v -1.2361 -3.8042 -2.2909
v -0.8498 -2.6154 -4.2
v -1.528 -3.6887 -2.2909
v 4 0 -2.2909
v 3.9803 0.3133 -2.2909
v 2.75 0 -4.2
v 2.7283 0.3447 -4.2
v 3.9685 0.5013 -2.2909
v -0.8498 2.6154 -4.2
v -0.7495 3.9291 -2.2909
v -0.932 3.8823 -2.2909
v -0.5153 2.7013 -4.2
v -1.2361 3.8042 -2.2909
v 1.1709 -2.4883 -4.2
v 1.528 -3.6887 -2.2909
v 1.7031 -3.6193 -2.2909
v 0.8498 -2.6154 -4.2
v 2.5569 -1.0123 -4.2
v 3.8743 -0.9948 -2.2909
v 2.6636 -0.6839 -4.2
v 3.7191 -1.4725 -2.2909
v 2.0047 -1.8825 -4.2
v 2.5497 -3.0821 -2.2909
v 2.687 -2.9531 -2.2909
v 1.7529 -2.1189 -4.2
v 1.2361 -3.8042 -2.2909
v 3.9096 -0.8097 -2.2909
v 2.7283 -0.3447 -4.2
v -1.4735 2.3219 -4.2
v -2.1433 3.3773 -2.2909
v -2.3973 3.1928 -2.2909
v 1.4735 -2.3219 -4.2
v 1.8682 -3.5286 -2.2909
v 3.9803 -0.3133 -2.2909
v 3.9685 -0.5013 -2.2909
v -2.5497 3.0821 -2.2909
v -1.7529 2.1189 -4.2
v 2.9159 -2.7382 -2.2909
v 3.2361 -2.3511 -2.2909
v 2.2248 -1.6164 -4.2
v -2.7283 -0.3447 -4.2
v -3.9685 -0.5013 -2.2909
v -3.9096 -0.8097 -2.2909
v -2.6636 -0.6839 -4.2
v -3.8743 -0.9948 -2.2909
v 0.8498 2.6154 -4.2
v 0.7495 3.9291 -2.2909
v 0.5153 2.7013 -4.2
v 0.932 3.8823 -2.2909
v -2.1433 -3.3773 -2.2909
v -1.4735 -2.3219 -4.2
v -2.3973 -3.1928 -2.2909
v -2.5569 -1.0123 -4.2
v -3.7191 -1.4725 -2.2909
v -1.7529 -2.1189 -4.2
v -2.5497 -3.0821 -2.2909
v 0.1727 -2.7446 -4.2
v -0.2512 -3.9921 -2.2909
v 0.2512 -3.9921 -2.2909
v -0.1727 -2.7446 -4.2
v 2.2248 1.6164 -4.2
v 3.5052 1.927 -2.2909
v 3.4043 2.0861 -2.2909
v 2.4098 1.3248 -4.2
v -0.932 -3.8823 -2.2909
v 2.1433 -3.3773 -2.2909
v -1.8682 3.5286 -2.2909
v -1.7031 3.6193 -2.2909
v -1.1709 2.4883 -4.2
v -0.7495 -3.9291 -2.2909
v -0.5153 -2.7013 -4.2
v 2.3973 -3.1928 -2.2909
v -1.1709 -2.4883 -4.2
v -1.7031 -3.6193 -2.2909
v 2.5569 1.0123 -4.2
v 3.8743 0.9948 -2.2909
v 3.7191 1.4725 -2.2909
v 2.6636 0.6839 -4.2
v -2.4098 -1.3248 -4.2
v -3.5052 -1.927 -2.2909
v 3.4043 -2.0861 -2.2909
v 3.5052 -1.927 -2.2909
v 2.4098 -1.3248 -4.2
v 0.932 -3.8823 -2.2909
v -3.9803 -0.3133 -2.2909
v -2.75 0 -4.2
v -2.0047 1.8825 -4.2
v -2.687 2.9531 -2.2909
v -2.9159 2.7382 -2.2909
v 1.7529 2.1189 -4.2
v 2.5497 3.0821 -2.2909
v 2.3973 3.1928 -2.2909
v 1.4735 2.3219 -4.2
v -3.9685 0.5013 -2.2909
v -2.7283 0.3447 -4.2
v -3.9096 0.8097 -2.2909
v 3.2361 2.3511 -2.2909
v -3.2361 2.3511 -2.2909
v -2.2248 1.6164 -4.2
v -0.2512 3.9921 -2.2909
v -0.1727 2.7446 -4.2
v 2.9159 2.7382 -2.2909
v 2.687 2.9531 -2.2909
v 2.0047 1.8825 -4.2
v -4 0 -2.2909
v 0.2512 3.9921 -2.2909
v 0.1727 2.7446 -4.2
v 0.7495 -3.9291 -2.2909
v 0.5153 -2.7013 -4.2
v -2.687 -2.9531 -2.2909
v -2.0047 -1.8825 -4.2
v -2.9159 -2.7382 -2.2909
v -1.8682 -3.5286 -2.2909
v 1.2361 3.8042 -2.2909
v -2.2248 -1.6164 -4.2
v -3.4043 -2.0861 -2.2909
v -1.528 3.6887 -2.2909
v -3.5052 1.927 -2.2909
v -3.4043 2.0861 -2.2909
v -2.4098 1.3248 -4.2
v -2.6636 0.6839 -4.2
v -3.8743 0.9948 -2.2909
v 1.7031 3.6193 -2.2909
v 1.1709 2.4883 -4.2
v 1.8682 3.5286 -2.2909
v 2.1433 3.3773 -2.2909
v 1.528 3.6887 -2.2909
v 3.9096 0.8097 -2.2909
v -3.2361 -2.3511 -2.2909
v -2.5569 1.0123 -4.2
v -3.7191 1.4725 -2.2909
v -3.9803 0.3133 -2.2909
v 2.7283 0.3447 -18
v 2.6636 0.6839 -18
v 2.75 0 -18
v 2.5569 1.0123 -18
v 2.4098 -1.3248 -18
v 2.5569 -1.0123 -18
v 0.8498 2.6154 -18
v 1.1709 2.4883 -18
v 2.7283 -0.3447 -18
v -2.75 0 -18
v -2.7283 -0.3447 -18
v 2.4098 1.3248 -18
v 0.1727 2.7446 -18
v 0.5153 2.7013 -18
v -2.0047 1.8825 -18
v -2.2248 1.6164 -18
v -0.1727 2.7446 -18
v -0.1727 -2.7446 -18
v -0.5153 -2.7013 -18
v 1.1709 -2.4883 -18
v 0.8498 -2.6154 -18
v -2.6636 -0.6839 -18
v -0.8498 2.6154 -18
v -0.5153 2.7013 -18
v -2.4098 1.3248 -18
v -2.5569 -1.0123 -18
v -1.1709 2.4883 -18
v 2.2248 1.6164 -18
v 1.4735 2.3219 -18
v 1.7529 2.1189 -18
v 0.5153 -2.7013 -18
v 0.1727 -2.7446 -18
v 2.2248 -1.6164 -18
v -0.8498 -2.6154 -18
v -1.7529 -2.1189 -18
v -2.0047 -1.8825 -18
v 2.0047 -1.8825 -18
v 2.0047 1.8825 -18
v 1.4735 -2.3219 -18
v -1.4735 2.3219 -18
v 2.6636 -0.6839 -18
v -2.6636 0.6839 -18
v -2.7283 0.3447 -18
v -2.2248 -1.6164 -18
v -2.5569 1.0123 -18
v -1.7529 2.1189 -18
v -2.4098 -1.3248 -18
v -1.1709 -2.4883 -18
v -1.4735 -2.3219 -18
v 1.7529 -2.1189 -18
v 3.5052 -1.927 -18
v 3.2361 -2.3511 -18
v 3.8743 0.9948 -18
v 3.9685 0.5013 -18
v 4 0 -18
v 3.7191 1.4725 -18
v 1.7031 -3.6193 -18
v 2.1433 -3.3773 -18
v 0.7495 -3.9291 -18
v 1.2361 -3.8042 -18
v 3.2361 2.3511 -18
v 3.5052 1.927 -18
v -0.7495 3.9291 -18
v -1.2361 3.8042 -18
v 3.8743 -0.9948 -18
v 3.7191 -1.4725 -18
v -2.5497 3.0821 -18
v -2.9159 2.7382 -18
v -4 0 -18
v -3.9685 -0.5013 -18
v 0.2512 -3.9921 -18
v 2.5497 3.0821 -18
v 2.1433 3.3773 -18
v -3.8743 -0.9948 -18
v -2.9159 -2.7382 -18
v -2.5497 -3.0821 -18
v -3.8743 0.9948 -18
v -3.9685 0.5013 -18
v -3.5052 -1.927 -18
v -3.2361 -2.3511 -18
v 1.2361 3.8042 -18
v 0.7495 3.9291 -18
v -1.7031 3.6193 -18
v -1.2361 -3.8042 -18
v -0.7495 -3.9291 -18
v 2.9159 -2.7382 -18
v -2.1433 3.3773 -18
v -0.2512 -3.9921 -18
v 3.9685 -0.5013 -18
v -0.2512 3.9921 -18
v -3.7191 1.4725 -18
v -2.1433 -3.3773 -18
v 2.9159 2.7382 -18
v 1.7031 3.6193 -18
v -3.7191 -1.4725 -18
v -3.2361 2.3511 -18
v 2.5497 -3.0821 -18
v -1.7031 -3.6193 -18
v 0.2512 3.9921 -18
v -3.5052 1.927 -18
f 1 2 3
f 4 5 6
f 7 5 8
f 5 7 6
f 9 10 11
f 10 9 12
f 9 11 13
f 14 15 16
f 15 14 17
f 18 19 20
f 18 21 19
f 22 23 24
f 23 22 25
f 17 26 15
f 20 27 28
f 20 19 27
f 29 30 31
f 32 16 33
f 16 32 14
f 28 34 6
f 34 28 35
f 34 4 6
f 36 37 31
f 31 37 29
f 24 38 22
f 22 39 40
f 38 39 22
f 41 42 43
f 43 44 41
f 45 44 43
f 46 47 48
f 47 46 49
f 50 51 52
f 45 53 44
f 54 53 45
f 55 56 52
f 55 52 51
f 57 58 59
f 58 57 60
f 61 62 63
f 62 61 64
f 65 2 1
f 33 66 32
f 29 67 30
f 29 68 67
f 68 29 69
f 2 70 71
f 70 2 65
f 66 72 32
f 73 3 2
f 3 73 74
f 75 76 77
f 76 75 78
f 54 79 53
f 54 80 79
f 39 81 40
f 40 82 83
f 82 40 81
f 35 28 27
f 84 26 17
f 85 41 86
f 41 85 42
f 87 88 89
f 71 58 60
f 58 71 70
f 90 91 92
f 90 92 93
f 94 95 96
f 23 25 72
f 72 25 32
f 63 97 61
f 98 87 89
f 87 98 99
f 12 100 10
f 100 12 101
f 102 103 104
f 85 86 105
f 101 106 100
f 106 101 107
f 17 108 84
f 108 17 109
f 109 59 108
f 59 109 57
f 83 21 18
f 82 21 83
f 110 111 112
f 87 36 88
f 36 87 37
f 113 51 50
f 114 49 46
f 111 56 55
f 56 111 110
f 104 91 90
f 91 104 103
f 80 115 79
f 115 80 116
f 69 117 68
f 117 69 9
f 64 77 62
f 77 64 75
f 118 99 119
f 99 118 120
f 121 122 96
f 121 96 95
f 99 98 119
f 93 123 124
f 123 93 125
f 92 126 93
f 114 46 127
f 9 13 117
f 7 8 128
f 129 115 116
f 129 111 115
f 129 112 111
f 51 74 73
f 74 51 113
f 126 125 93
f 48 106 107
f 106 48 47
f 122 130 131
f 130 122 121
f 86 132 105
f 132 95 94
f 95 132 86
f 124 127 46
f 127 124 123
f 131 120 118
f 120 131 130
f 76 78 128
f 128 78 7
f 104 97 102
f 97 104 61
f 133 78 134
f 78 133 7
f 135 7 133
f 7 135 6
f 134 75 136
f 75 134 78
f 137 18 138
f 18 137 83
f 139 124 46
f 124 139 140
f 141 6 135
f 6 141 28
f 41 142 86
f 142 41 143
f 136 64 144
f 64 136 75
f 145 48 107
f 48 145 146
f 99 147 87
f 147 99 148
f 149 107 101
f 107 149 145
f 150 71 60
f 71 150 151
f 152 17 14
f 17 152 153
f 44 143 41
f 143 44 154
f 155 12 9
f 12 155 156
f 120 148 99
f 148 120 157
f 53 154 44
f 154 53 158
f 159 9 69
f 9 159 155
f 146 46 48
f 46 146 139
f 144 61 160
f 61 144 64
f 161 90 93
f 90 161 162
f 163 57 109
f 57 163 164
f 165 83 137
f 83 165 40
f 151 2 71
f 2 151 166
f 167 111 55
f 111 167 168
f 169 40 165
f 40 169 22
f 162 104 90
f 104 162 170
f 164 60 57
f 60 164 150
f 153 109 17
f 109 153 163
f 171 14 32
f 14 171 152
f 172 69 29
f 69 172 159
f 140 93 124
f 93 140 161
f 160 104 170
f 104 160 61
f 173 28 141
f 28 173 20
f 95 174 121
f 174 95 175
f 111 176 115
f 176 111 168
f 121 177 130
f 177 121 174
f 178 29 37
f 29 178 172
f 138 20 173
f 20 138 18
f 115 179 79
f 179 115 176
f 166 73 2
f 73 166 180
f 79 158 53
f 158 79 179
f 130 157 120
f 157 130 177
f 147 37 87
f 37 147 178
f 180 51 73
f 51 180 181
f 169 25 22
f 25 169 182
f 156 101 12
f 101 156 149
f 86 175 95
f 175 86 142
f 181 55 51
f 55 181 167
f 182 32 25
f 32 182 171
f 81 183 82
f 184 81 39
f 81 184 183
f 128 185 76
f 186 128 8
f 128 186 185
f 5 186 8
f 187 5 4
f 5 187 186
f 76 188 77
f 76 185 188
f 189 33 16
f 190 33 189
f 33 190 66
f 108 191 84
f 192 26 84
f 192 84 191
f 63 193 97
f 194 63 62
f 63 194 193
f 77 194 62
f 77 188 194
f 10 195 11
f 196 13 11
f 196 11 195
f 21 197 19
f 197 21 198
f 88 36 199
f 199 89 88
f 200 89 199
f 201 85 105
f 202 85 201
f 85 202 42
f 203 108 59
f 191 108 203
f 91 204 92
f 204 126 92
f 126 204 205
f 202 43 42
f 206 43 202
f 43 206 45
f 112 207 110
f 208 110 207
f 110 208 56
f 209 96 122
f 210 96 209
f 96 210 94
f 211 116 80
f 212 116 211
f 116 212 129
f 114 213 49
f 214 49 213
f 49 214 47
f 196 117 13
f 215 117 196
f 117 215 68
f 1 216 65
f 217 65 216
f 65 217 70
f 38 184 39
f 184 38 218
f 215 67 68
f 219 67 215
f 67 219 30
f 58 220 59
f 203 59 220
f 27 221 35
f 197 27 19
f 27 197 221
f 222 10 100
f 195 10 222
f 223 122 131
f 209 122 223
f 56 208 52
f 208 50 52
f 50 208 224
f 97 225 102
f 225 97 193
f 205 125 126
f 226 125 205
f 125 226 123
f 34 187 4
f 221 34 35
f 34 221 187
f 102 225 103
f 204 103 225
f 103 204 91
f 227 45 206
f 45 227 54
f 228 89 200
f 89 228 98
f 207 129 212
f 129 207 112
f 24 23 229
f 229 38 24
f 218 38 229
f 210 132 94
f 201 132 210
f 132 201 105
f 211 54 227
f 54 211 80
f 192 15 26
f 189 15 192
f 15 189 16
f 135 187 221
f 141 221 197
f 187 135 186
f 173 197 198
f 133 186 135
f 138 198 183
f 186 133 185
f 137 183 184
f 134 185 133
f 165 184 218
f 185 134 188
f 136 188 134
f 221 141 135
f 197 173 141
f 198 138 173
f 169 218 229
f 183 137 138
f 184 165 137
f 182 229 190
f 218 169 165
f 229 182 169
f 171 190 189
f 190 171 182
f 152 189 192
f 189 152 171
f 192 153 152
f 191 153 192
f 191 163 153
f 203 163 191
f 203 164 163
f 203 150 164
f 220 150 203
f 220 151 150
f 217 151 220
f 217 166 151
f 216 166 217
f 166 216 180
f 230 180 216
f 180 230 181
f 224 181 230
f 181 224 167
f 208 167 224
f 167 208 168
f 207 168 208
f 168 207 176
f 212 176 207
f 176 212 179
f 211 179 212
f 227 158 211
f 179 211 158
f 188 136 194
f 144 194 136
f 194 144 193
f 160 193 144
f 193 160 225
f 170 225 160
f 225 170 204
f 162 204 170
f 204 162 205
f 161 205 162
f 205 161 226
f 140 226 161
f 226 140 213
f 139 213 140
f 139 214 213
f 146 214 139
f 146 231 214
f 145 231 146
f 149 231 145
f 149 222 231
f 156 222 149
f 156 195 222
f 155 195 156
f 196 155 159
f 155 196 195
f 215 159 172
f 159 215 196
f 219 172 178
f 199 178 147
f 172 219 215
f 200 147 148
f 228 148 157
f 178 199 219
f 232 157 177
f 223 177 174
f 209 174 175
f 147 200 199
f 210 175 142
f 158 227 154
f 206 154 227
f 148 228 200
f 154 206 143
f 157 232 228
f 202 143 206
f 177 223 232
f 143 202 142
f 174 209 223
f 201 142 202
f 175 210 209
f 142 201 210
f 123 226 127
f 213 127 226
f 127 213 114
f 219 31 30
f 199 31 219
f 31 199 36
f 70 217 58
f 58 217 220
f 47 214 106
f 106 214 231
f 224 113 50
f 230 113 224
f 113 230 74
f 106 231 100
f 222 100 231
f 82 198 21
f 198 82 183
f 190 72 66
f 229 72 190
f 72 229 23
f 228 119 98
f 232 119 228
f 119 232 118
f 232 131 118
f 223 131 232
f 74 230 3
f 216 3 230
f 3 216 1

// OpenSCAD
$fn = 50;

difference() {
	union() {
		translate(v = [0, 0, -18.0]) {
			cylinder(h = 18, r = 4.0);
		}
	}
	union() {
		translate(v = [0, 0, 0]) {
			rotate(a = [0, 0, 0]) {
				difference() {
					union() {
						translate(v = [0, 0, -21.0]) {
							cylinder(h = 21, r = 2.25);
						}
						translate(v = [0, 0, -4.2]) {
							cylinder(h = 4.2, r1 = 2.75, r2 = 5.5);
						}
						translate(v = [0, 0, -21.0]) {
							cylinder(h = 21, r = 2.75);
						}
						translate(v = [0, 0, -21.0]) {
							cylinder(h = 21, r = 2.25);
						}
					}
					union();
				}
			}
		}
	}
}
